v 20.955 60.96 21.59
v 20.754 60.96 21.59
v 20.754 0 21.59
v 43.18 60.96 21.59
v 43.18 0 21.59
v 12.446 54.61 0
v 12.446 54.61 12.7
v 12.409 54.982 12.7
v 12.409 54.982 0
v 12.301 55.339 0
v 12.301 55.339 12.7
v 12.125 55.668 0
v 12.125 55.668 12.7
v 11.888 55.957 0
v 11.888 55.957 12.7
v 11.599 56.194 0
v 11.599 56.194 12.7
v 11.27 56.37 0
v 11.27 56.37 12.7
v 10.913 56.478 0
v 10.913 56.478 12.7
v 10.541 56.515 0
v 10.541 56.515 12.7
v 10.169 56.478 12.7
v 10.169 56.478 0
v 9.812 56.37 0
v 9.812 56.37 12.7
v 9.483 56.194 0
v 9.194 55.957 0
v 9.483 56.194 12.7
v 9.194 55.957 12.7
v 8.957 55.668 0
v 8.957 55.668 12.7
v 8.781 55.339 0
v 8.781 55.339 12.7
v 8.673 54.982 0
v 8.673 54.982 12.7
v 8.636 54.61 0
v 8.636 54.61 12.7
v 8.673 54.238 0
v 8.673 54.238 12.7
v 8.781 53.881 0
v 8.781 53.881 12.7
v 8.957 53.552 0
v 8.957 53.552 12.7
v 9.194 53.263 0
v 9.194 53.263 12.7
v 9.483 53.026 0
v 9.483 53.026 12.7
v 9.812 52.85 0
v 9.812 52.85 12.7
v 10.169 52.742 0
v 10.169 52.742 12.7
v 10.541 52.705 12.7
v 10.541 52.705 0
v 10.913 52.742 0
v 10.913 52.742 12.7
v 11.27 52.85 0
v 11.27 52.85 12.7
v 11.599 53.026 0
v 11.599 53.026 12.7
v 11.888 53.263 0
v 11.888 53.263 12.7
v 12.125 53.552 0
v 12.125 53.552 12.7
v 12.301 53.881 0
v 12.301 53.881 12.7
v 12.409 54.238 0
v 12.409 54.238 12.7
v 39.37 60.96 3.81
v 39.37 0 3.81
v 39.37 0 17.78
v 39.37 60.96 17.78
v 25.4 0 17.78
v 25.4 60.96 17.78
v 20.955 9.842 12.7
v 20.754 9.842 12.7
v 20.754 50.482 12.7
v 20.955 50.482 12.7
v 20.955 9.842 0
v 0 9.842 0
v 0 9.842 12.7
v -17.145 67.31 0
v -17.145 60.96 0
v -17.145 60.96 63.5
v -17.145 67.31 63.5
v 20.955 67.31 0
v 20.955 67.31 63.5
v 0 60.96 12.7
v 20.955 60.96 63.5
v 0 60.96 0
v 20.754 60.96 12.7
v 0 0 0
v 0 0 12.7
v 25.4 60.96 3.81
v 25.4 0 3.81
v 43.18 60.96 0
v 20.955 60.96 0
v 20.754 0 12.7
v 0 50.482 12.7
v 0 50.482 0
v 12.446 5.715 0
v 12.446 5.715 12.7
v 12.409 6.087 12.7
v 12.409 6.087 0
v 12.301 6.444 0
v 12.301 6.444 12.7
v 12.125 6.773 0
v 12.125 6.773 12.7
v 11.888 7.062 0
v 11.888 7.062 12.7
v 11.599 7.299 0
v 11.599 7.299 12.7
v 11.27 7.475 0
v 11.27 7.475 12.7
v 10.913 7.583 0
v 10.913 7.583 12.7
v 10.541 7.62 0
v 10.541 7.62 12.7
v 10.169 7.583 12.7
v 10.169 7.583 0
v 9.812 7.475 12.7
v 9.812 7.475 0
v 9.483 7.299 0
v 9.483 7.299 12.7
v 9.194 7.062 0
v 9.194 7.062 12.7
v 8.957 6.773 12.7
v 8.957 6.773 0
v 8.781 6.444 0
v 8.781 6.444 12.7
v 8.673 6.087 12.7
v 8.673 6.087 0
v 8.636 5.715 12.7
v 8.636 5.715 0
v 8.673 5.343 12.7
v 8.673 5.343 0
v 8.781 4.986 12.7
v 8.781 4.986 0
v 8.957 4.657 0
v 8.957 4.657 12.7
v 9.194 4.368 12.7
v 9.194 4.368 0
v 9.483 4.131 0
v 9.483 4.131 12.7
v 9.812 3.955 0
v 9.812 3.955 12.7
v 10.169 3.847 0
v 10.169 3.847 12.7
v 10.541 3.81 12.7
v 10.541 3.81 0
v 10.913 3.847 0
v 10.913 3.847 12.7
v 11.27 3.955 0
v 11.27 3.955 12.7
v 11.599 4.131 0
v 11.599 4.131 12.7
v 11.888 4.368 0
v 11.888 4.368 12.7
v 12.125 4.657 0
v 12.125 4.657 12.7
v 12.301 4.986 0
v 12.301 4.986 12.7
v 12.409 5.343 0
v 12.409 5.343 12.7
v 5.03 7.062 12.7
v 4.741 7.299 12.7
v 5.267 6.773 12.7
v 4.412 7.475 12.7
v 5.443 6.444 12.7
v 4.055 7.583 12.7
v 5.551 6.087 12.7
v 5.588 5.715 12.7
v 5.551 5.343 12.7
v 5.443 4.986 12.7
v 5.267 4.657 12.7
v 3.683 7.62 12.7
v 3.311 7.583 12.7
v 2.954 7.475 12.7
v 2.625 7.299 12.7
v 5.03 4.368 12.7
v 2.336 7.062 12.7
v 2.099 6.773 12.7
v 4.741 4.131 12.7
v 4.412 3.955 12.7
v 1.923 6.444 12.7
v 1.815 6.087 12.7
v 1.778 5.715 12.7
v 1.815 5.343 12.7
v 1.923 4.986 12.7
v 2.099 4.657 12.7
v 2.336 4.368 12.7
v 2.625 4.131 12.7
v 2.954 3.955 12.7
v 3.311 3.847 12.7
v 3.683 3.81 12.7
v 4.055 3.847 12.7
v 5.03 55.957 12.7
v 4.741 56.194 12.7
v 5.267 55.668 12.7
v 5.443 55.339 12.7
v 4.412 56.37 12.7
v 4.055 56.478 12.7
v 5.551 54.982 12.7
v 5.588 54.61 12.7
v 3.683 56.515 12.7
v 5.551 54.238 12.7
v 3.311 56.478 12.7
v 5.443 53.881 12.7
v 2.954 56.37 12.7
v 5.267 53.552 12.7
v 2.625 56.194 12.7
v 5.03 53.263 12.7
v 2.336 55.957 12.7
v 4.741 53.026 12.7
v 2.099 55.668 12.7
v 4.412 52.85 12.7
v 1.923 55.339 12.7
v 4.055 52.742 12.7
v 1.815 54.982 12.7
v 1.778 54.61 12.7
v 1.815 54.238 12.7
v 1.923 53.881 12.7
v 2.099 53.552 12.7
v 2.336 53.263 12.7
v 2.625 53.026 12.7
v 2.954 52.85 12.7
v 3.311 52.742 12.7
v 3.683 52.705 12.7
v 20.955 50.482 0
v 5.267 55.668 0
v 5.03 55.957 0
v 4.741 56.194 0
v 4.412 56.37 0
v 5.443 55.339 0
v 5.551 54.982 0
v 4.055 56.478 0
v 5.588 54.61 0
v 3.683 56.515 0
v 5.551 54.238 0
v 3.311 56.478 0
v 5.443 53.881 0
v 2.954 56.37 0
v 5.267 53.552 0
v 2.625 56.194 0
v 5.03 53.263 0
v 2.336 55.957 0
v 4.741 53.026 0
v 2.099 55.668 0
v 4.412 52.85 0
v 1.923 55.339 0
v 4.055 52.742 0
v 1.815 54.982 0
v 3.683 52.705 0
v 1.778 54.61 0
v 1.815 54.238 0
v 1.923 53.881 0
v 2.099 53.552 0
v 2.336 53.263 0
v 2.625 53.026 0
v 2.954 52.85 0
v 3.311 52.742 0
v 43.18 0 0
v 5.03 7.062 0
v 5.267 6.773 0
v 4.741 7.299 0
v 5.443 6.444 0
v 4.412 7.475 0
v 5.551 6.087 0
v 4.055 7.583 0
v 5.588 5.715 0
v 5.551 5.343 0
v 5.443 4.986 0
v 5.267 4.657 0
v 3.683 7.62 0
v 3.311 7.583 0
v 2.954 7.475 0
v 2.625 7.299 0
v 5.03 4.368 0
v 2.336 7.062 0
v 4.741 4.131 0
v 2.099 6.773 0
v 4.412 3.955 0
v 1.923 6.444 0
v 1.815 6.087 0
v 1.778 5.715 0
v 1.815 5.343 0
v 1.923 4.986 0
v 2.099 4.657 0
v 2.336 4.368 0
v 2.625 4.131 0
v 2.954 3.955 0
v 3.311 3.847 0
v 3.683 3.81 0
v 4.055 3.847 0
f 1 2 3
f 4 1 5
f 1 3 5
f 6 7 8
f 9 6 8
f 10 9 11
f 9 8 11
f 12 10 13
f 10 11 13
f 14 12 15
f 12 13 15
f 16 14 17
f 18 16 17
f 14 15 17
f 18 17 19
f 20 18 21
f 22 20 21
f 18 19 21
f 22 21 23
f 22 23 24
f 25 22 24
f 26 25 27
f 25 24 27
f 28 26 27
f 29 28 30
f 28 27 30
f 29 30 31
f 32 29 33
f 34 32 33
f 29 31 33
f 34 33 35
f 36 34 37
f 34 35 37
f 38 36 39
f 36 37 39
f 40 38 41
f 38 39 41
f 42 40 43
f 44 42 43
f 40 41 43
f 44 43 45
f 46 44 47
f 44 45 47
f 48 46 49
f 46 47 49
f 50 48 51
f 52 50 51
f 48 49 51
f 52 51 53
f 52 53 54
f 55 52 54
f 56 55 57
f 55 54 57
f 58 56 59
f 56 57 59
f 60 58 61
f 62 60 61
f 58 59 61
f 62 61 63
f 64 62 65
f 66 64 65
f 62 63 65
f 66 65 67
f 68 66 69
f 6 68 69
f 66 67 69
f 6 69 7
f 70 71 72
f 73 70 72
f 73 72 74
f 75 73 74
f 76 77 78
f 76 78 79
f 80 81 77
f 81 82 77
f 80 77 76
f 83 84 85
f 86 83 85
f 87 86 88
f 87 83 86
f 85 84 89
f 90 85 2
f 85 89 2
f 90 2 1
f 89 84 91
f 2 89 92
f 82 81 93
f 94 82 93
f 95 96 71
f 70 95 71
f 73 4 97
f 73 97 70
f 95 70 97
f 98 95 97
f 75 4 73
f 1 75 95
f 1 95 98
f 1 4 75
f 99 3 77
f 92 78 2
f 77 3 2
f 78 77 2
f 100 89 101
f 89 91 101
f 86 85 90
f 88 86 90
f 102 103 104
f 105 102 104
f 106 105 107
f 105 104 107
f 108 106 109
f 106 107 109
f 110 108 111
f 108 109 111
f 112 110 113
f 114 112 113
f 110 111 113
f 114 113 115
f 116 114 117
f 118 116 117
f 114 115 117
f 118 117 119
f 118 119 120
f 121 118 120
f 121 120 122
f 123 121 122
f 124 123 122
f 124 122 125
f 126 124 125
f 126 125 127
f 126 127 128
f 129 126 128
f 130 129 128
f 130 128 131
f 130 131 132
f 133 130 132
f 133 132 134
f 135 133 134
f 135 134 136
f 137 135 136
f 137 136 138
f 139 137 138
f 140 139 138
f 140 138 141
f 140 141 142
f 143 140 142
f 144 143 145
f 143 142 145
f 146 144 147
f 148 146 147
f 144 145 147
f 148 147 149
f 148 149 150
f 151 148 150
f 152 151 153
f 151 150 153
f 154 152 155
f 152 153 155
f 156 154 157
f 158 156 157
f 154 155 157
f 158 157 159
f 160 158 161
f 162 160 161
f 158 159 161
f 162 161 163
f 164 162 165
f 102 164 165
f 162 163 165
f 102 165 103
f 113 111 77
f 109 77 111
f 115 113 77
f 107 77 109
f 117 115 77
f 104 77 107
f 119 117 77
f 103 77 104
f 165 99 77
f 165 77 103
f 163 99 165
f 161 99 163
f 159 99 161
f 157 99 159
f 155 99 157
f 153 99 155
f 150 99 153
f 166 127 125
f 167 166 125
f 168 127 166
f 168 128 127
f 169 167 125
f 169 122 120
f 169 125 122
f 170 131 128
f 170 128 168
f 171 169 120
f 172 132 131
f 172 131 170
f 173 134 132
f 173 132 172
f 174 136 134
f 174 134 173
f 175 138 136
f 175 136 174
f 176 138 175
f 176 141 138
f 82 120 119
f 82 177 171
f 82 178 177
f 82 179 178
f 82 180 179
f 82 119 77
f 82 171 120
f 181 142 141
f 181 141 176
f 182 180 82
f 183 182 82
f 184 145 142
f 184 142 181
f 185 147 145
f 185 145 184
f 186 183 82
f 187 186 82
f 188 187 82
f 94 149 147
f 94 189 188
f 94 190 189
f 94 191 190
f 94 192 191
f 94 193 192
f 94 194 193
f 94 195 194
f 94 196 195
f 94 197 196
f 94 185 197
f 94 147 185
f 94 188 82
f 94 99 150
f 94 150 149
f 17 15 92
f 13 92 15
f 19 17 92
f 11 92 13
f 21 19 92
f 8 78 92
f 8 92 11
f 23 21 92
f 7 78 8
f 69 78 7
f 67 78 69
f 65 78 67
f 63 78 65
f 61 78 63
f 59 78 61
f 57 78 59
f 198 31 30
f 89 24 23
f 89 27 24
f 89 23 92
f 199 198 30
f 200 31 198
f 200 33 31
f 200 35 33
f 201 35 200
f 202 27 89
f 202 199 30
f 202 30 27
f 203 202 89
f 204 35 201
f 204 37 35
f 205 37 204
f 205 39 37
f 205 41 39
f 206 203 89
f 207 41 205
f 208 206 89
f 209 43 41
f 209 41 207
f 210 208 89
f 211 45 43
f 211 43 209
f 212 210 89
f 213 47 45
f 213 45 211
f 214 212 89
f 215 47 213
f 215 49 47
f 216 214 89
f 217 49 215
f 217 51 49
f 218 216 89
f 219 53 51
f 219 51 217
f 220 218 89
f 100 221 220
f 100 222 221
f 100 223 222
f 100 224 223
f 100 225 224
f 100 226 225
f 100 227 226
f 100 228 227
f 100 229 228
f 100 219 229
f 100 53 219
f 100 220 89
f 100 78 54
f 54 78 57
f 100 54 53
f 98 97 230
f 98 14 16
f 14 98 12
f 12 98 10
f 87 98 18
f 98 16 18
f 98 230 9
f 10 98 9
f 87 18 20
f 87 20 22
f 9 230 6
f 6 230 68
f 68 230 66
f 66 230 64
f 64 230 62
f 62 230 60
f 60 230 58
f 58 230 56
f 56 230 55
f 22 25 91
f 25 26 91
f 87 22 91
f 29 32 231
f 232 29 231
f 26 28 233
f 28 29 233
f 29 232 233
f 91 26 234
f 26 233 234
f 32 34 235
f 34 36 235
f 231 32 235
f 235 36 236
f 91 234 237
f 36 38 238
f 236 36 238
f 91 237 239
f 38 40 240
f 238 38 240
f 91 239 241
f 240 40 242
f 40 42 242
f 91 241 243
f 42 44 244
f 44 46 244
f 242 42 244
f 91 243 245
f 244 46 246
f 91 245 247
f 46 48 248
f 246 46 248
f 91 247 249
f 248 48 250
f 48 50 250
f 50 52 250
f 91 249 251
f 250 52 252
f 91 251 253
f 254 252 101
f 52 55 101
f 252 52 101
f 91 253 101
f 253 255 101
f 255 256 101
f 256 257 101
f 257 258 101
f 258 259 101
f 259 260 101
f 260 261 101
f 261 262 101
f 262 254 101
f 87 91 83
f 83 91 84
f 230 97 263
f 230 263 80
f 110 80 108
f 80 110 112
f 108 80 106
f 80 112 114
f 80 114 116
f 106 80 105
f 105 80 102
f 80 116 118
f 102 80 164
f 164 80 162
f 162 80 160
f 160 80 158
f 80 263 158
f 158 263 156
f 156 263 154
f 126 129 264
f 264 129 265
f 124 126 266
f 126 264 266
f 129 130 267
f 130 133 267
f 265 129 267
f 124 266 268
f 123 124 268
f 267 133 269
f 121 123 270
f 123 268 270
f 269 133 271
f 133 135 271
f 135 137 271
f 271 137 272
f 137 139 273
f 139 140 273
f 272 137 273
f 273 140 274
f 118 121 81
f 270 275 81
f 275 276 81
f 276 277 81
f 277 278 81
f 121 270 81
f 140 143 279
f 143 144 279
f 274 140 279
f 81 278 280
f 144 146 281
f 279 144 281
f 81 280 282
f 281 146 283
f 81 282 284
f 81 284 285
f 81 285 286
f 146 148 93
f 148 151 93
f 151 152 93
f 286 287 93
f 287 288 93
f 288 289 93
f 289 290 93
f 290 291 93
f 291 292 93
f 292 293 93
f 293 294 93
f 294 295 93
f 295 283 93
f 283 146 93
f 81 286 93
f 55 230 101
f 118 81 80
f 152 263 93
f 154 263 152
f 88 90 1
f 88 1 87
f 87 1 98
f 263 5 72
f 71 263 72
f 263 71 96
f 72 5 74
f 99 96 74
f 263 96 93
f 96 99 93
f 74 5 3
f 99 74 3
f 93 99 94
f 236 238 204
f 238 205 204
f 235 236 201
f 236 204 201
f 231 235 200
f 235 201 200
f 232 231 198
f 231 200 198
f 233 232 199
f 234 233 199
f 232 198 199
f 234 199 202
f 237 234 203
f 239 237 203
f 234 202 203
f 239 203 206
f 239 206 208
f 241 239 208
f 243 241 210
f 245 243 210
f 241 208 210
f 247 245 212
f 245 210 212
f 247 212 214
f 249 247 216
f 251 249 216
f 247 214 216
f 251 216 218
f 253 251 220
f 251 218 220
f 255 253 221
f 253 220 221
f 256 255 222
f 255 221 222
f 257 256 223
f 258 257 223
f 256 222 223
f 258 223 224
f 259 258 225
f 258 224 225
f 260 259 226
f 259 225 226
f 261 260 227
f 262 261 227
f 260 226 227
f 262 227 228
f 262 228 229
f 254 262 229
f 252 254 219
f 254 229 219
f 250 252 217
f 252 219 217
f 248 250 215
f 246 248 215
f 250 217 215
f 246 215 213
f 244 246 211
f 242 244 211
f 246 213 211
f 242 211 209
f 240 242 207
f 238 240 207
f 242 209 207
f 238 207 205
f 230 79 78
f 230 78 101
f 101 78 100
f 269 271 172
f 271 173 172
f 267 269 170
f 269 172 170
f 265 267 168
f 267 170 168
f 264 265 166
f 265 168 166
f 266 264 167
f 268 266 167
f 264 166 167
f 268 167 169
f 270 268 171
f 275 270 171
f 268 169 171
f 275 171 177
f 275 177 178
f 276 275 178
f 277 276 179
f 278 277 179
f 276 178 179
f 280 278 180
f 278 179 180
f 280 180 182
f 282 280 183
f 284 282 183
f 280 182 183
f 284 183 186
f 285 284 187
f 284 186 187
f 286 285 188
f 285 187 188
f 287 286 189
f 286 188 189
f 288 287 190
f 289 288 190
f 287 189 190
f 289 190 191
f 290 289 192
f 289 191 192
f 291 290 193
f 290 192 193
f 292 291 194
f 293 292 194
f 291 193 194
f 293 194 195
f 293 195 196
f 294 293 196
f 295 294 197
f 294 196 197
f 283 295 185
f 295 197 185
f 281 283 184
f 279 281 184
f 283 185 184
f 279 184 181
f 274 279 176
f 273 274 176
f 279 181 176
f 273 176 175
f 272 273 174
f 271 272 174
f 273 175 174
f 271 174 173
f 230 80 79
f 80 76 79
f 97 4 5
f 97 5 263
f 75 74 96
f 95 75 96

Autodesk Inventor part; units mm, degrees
ref_plane "YZ Plane" through (0, 0, 0) normal (1, 0, 0) x (0, 1, 0)
ref_plane "XZ Plane" through (0, 0, 0) normal (0, 1, 0) x (-1, 0, 0)
ref_plane "XY Plane" through (0, 0, 0) normal (0, 0, 1) x (1, 0, 0)
sketch "Sketch1" plane through (0, 0, 0) normal (0, 0, 1) x (1, 0, 0)
  line L0 (0, 0) -> (70.612, 0)
  line L1 (70.612, 0) -> (70.612, 60.96)
  line L2 (70.612, 60.96) -> (0, 60.96)
  line L3 (0, 60.96) -> (0, 0)
  dimension "d0" = 70.612
  dimension "d1" = 60.96
sketch "Sketch2" plane through (0, 0, 0) normal (0, 0, 1) x (1, 0, 0)
  point P0 (0, 0)
extrude "Extrusion1" add sketch "Sketch1" along normal blind 12.7
sketch "Sketch3" plane through (0, 0, 12.7) normal (0, 0, 1) x (1, 0, 0)
  circle A0 centre (3.683, 54.61) radius 1.905
  circle A1 centre (10.541, 54.61) radius 1.905
  circle A2 centre (3.683, 5.715) radius 1.905
  circle A3 centre (10.541, 5.715) radius 1.905
  point P0 (0, 0)
  dimension "d4" = 3.81
  dimension "d5" = 3.81
  dimension "d6" = 3.81
  dimension "d7" = 3.81
extrude "Extrusion2" cut sketch "Sketch3" against normal blind 12.7
sketch "Sketch4" plane through (0, 0, 12.7) normal (0, 0, 1) x (1, 0, 0)
  line L0 (70.612, 60.96) -> (0, 60.96) projected
  line L1 (70.612, 0) -> (70.612, 60.96) projected
  line L2 (38.1, 60.96) -> (70.612, 60.96)
  line L3 (70.612, 60.96) -> (70.612, 0)
  line L4 (70.612, 0) -> (38.1, 0)
  line L5 (38.1, 0) -> (38.1, 60.96)
  line L6 (0, 60.96) -> (0, 0) projected
  dimension "d10" = 38.1
extrude "Extrusion3" add sketch "Sketch4" along normal blind 20.32
sketch "Sketch5" plane through (0, 0, 12.7) normal (0, 0, 1) x (1, 0, 0)
  line L0 (0, 60.96) -> (0, 0) projected
  line L1 (0, 9.8425) -> (20.955, 9.8425)
  line L2 (20.955, 9.8425) -> (20.955, 50.4825)
  line L3 (20.955, 50.4825) -> (0, 50.4825)
  line L4 (0, 50.4825) -> (0, 9.8425)
  dimension "d13" = 20.955
  dimension "d14" = 40.64
extrude "Extrusion4" cut sketch "Sketch5" against normal blind 12.7
sketch "Sketch6" plane through (0, 60.96, 0) normal (0, 1, 0) x (1, 0, 0)
  line L0 (12.446, -12.7) -> (12.446, 0) projected
  line L1 (12.446, 0) -> (53.086, 0)
  line L2 (53.086, 0) -> (53.086, -12.7)
  line L3 (53.086, -12.7) -> (12.446, -12.7)
  line L4 (12.446, -12.7) -> (12.446, 0)
  point P0 (0, 0)
  dimension "d17" = 40.64
extrude "Extrusion5" add sketch "Sketch6" along normal blind 20.32
sketch "Sketch7" plane through (0, 0, 12.7) normal (0, 0, 1) x (1, 0, 0)
  circle A0 centre (20.955, 76.2) radius 1.905
  circle A1 centre (20.955, 67.31) radius 1.905
  circle A2 centre (40.64, 67.31) radius 1.905
  circle A3 centre (40.64, 76.2) radius 1.905
  point P0 (0, 0)
  dimension "d20" = 3.81
  dimension "d21" = 3.81
  dimension "d22" = 3.81
  dimension "d23" = 3.81
extrude "Extrusion6" cut sketch "Sketch7" against normal blind 12.7
sketch "Sketch8" plane through (0, 0, 12.7) normal (0, 0, 1) x (1, 0, 0)
  line L0 (12.446, 60.96) -> (12.446, 81.28) projected
  line L1 (70.612, 60.96) -> (53.086, 60.96) projected
  line L2 (12.446, 81.28) -> (53.086, 81.28)
  line L3 (53.086, 81.28) -> (53.086, 60.96)
  line L4 (53.086, 60.96) -> (12.446, 60.96)
  line L5 (12.446, 60.96) -> (12.446, 81.28)
  point P0 (0, 0)
extrude "Extrusion7" cut sketch "Sketch8" against normal blind 25.4
sketch "Sketch9" plane through (0, 0, 12.7) normal (0, 0, 1) x (1, 0, 0)
  point P0 (0, 0)
sketch "Sketch10" plane through (0, 0, 33.02) normal (0, 0, 1) x (1, 0, 0)
  line L0 (38.1, 60.96) -> (0, 60.96) projected
  line L1 (38.1, 0) -> (20.7539, 0)
  line L2 (20.7539, 0) -> (20.7539, 60.96)
  line L3 (20.7539, 60.96) -> (38.1, 60.96)
  line L4 (38.1, 60.96) -> (38.1, 0)
  point P0 (0, 0)
extrude "Extrusion8" add sketch "Sketch10" against normal blind 20.32
sketch "Sketch11" plane through (0, 0, 0) normal (0, -1, 0) x (1, 0, 0)
  line L0 (70.612, 33.02) -> (20.7539, 33.02) projected
  line L1 (0, 0) -> (70.612, 0) projected
  line L2 (70.612, 33.02) -> (45.212, 33.02)
  line L3 (45.212, 33.02) -> (45.212, 0)
  line L4 (45.212, 0) -> (70.612, 0)
  line L5 (70.612, 0) -> (70.612, 33.02)
  dimension "d30" = 25.4
extrude "Extrusion9" cut sketch "Sketch11" against normal blind 76.2
sketch "Sketch12" plane through (0, 0, 0) normal (0, -1, 0) x (1, 0, 0)
  line L0 (25.4, 3.81) -> (39.37, 3.81)
  line L1 (39.37, 3.81) -> (39.37, 17.78)
  line L2 (39.37, 17.78) -> (25.4, 17.78)
  line L3 (25.4, 17.78) -> (25.4, 3.81)
  point P0 (0, 0)
  dimension "d33" = 13.97
  dimension "d34" = 13.97
extrude "Extrusion10" cut sketch "Sketch12" against normal blind 76.2
sketch "Sketch13" plane through (0, 0, 0) normal (0, -1, 0) x (1, 0, 0)
  line L0 (20.7539, 33.02) -> (20.7539, 12.7) projected
  line L1 (45.212, 33.02) -> (20.7539, 33.02) projected
  line L2 (20.7539, 21.59) -> (45.212, 21.59)
  line L3 (45.212, 21.59) -> (45.212, 33.02)
  line L4 (45.212, 33.02) -> (20.7539, 33.02)
  line L5 (20.7539, 33.02) -> (20.7539, 21.59)
  point P0 (0, 0)
extrude "Extrusion11" cut sketch "Sketch13" against normal blind 76.2
sketch "Sketch14" plane through (0, 60.96, 12.7) normal (0, 1, 0) x (1, 0, 0)
  line L0 (45.212, -8.89) -> (20.7539, -8.89) projected
  line L1 (45.212, -8.89) -> (43.18, -8.89)
  line L2 (43.18, -8.89) -> (43.18, 12.7)
  line L3 (43.18, 12.7) -> (45.212, 12.7)
  line L4 (45.212, 12.7) -> (45.212, -8.89)
  point P0 (0, 12.7)
  dimension "d39" = 2.032
extrude "Extrusion12" cut sketch "Sketch14" against normal blind 76.2
sketch "Sketch15" plane through (0, 60.96, 12.7) normal (0, 1, 0) x (1, 0, 0)
  line L0 (20.955, 0) -> (20.955, 12.7) projected
  line L1 (20.955, 12.7) -> (-17.145, 12.7)
  line L2 (-17.145, 12.7) -> (-17.145, -50.8)
  line L3 (-17.145, -50.8) -> (20.955, -50.8)
  line L4 (20.955, -50.8) -> (20.955, 12.7)
  point P0 (0, 12.7)
  dimension "d42" = 38.1
  dimension "d43" = 63.5
extrude "Extrusion13" add sketch "Sketch15" along normal blind 6.35
properties part number "servo_rack"
